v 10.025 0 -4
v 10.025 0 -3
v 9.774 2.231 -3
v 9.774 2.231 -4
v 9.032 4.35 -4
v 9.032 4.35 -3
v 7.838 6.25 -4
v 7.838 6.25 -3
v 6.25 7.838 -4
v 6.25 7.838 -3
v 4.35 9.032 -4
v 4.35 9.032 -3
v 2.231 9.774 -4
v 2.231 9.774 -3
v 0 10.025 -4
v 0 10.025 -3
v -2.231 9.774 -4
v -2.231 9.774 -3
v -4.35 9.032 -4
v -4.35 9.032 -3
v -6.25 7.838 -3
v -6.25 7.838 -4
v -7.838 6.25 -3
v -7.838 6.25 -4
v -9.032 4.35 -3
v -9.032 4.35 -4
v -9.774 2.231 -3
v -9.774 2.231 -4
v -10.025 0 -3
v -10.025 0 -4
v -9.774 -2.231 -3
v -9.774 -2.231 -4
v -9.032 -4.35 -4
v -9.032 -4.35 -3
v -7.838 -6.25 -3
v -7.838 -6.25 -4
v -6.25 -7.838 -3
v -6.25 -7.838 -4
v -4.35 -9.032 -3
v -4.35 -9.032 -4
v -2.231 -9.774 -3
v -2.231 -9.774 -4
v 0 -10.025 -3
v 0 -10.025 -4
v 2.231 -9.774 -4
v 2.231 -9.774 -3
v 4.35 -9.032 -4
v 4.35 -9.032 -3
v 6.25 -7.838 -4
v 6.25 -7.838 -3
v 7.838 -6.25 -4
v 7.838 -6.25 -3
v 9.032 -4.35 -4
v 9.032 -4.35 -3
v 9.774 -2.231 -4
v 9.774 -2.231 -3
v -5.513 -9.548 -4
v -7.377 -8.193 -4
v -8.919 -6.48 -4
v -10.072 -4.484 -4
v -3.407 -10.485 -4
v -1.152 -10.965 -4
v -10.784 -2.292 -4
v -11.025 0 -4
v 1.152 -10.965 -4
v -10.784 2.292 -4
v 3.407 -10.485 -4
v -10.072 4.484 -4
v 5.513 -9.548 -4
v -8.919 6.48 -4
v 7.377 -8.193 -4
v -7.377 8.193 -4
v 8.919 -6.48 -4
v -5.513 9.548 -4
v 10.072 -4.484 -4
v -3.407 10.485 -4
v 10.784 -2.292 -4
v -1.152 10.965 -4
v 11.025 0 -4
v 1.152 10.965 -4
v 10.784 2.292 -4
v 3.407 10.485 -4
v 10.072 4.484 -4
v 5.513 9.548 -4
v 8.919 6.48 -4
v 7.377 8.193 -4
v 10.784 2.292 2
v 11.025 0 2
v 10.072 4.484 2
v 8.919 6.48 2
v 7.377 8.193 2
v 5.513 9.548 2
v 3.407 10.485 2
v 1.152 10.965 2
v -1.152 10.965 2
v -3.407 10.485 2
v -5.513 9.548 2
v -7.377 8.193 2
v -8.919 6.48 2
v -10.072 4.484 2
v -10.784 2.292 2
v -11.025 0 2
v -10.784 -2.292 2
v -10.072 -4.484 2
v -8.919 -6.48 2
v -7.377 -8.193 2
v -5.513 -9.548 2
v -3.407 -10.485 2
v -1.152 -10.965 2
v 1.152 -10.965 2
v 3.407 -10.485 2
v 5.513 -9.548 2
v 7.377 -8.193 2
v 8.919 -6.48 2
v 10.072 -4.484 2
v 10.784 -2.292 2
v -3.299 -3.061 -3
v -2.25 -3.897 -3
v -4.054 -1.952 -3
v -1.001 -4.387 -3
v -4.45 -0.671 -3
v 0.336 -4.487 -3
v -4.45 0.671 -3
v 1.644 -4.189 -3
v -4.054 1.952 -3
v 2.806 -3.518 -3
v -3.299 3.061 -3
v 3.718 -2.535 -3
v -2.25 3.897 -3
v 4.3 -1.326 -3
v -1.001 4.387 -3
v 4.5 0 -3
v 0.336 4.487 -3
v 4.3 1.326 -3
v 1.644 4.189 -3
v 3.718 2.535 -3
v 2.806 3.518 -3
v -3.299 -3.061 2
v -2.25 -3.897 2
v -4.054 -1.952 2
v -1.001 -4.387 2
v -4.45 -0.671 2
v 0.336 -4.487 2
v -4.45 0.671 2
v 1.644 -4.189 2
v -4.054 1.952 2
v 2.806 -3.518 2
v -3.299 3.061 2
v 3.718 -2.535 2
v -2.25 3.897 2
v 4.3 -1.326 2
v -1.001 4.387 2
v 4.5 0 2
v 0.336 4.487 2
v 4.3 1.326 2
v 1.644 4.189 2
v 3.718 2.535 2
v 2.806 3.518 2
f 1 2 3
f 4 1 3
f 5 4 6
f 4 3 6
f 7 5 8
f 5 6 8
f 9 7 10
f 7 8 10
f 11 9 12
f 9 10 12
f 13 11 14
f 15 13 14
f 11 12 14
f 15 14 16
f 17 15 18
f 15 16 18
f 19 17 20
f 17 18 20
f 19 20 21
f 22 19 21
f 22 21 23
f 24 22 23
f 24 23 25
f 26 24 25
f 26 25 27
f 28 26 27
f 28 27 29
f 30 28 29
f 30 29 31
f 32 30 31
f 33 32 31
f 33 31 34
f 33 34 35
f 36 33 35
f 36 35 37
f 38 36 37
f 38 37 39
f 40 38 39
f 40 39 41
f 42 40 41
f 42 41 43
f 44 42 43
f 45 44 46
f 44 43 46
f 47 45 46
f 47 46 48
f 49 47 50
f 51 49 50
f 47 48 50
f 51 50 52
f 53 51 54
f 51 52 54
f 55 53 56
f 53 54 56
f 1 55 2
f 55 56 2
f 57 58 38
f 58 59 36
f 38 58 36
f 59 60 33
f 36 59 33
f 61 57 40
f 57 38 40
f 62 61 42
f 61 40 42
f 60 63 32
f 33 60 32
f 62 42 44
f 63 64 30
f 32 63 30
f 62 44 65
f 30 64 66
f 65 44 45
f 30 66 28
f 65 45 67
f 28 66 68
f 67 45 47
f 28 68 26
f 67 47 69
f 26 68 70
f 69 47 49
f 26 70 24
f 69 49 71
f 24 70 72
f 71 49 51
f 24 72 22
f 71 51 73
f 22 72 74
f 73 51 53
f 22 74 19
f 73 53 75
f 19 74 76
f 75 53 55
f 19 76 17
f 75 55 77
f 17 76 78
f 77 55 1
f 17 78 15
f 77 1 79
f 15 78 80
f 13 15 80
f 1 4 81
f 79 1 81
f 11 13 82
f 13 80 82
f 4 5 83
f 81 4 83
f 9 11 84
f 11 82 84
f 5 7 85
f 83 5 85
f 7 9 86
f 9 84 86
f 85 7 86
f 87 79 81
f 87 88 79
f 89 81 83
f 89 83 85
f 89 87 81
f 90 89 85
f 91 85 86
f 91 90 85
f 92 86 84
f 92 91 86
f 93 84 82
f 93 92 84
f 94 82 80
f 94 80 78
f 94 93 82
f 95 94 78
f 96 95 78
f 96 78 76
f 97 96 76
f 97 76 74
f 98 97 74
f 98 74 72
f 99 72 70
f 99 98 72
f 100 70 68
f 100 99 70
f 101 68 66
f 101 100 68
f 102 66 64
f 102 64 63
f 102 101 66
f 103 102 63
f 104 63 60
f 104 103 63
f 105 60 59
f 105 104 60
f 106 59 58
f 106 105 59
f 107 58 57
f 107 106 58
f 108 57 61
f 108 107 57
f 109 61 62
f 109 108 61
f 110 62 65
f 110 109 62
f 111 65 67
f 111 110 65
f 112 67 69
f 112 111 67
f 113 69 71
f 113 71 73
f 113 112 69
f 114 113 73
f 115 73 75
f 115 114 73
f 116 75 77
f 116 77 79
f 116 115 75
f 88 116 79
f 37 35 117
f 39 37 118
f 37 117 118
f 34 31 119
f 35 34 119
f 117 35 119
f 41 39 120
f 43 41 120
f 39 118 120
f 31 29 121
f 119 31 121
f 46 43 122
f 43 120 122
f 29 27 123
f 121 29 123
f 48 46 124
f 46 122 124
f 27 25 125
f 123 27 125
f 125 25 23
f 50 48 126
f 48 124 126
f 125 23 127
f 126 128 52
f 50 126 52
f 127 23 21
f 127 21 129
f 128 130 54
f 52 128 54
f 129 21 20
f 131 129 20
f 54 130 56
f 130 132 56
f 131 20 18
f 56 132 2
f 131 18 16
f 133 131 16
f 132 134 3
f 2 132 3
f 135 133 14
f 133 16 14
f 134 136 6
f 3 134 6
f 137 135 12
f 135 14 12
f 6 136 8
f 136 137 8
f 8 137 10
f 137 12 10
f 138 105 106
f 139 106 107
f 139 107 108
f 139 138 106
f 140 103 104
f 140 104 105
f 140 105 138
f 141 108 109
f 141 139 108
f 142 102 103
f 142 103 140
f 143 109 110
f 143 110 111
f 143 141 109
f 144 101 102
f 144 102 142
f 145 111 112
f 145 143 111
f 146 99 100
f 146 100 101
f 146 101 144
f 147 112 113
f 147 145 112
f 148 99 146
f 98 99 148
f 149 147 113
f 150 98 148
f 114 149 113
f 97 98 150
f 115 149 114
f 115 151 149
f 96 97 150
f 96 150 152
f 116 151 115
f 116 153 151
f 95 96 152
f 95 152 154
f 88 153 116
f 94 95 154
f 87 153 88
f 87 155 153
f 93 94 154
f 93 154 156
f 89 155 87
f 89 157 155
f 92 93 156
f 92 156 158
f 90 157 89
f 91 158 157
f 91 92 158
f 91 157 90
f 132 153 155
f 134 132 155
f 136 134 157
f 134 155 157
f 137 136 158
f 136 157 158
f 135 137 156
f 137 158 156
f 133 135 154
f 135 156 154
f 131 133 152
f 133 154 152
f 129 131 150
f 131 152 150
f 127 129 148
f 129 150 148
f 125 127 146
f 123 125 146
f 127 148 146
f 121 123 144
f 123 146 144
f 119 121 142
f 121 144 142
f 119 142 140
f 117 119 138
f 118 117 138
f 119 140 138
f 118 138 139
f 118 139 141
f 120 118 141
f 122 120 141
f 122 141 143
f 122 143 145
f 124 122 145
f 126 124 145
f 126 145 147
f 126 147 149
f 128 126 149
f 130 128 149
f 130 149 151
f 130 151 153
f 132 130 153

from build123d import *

# Parameters (mm, degrees)
F0_R        = 10.025
F0_R_2      = 4.5
F1_DEPTH    = 1.5
F0_R_3      = 11.025
F1_FACE_R   = 10.025
F1_FACE_R_2 = 4.5
F2_DEPTH    = 2
F3_DEPTH    = 2
F4_DEPTH    = 1.5
F5_DEPTH    = 1.5
F6_DEPTH    = 2
F7_DEPTH    = 1.5


with BuildPart() as f1:
    # F0 (on Top) → F1 (new body)
    with BuildSketch(Plane.XY):
        Circle(F0_R)
        Circle(F0_R_2, mode=Mode.SUBTRACT)
    extrude(amount=F1_DEPTH)

    # F0 (on Top) + F1_face (on face) → F2 (join)
    with BuildSketch(Plane.XY):
        Circle(F0_R_3)
        Circle(F0_R, mode=Mode.SUBTRACT)
    with BuildSketch(Plane(origin=(0, 0, 0), x_dir=(1, 0, 0), z_dir=(0, 0, -1))):
        Circle(F1_FACE_R)
        Circle(F1_FACE_R_2, mode=Mode.SUBTRACT)
    extrude(amount=F2_DEPTH, dir=(0, 0, 1))

    # F0 (on Top) → F3 (join)
    with BuildSketch(Plane.XY):
        Circle(F0_R_3)
        Circle(F0_R, mode=Mode.SUBTRACT)
    extrude(amount=-F3_DEPTH)

    # F4 (add): a face of the model
    f4_faces = [f1.faces().sort_by_distance(p)[0] for p in [
        (-9.7414501807, 0, 0),
    ]]
    extrude(f4_faces, amount=F4_DEPTH)

    # F5 (add): a face of the model
    f5_faces = [f1.faces().sort_by_distance(p)[0] for p in [
        (-9.7414501807, 0, -1.5),
    ]]
    extrude(f5_faces, amount=F5_DEPTH)

    # F6 (add): a face of the model
    f6_faces = [f1.faces().sort_by_distance(p)[0] for p in [
        (-10.7131659095, 0, -2),
    ]]
    extrude(f6_faces, amount=F6_DEPTH)

    # F0 (on Top) → F7 (join)
    with BuildSketch(Plane.XY):
        Circle(F0_R)
        Circle(F0_R_2, mode=Mode.SUBTRACT)
    extrude(amount=-F7_DEPTH)


solid = f1.part
